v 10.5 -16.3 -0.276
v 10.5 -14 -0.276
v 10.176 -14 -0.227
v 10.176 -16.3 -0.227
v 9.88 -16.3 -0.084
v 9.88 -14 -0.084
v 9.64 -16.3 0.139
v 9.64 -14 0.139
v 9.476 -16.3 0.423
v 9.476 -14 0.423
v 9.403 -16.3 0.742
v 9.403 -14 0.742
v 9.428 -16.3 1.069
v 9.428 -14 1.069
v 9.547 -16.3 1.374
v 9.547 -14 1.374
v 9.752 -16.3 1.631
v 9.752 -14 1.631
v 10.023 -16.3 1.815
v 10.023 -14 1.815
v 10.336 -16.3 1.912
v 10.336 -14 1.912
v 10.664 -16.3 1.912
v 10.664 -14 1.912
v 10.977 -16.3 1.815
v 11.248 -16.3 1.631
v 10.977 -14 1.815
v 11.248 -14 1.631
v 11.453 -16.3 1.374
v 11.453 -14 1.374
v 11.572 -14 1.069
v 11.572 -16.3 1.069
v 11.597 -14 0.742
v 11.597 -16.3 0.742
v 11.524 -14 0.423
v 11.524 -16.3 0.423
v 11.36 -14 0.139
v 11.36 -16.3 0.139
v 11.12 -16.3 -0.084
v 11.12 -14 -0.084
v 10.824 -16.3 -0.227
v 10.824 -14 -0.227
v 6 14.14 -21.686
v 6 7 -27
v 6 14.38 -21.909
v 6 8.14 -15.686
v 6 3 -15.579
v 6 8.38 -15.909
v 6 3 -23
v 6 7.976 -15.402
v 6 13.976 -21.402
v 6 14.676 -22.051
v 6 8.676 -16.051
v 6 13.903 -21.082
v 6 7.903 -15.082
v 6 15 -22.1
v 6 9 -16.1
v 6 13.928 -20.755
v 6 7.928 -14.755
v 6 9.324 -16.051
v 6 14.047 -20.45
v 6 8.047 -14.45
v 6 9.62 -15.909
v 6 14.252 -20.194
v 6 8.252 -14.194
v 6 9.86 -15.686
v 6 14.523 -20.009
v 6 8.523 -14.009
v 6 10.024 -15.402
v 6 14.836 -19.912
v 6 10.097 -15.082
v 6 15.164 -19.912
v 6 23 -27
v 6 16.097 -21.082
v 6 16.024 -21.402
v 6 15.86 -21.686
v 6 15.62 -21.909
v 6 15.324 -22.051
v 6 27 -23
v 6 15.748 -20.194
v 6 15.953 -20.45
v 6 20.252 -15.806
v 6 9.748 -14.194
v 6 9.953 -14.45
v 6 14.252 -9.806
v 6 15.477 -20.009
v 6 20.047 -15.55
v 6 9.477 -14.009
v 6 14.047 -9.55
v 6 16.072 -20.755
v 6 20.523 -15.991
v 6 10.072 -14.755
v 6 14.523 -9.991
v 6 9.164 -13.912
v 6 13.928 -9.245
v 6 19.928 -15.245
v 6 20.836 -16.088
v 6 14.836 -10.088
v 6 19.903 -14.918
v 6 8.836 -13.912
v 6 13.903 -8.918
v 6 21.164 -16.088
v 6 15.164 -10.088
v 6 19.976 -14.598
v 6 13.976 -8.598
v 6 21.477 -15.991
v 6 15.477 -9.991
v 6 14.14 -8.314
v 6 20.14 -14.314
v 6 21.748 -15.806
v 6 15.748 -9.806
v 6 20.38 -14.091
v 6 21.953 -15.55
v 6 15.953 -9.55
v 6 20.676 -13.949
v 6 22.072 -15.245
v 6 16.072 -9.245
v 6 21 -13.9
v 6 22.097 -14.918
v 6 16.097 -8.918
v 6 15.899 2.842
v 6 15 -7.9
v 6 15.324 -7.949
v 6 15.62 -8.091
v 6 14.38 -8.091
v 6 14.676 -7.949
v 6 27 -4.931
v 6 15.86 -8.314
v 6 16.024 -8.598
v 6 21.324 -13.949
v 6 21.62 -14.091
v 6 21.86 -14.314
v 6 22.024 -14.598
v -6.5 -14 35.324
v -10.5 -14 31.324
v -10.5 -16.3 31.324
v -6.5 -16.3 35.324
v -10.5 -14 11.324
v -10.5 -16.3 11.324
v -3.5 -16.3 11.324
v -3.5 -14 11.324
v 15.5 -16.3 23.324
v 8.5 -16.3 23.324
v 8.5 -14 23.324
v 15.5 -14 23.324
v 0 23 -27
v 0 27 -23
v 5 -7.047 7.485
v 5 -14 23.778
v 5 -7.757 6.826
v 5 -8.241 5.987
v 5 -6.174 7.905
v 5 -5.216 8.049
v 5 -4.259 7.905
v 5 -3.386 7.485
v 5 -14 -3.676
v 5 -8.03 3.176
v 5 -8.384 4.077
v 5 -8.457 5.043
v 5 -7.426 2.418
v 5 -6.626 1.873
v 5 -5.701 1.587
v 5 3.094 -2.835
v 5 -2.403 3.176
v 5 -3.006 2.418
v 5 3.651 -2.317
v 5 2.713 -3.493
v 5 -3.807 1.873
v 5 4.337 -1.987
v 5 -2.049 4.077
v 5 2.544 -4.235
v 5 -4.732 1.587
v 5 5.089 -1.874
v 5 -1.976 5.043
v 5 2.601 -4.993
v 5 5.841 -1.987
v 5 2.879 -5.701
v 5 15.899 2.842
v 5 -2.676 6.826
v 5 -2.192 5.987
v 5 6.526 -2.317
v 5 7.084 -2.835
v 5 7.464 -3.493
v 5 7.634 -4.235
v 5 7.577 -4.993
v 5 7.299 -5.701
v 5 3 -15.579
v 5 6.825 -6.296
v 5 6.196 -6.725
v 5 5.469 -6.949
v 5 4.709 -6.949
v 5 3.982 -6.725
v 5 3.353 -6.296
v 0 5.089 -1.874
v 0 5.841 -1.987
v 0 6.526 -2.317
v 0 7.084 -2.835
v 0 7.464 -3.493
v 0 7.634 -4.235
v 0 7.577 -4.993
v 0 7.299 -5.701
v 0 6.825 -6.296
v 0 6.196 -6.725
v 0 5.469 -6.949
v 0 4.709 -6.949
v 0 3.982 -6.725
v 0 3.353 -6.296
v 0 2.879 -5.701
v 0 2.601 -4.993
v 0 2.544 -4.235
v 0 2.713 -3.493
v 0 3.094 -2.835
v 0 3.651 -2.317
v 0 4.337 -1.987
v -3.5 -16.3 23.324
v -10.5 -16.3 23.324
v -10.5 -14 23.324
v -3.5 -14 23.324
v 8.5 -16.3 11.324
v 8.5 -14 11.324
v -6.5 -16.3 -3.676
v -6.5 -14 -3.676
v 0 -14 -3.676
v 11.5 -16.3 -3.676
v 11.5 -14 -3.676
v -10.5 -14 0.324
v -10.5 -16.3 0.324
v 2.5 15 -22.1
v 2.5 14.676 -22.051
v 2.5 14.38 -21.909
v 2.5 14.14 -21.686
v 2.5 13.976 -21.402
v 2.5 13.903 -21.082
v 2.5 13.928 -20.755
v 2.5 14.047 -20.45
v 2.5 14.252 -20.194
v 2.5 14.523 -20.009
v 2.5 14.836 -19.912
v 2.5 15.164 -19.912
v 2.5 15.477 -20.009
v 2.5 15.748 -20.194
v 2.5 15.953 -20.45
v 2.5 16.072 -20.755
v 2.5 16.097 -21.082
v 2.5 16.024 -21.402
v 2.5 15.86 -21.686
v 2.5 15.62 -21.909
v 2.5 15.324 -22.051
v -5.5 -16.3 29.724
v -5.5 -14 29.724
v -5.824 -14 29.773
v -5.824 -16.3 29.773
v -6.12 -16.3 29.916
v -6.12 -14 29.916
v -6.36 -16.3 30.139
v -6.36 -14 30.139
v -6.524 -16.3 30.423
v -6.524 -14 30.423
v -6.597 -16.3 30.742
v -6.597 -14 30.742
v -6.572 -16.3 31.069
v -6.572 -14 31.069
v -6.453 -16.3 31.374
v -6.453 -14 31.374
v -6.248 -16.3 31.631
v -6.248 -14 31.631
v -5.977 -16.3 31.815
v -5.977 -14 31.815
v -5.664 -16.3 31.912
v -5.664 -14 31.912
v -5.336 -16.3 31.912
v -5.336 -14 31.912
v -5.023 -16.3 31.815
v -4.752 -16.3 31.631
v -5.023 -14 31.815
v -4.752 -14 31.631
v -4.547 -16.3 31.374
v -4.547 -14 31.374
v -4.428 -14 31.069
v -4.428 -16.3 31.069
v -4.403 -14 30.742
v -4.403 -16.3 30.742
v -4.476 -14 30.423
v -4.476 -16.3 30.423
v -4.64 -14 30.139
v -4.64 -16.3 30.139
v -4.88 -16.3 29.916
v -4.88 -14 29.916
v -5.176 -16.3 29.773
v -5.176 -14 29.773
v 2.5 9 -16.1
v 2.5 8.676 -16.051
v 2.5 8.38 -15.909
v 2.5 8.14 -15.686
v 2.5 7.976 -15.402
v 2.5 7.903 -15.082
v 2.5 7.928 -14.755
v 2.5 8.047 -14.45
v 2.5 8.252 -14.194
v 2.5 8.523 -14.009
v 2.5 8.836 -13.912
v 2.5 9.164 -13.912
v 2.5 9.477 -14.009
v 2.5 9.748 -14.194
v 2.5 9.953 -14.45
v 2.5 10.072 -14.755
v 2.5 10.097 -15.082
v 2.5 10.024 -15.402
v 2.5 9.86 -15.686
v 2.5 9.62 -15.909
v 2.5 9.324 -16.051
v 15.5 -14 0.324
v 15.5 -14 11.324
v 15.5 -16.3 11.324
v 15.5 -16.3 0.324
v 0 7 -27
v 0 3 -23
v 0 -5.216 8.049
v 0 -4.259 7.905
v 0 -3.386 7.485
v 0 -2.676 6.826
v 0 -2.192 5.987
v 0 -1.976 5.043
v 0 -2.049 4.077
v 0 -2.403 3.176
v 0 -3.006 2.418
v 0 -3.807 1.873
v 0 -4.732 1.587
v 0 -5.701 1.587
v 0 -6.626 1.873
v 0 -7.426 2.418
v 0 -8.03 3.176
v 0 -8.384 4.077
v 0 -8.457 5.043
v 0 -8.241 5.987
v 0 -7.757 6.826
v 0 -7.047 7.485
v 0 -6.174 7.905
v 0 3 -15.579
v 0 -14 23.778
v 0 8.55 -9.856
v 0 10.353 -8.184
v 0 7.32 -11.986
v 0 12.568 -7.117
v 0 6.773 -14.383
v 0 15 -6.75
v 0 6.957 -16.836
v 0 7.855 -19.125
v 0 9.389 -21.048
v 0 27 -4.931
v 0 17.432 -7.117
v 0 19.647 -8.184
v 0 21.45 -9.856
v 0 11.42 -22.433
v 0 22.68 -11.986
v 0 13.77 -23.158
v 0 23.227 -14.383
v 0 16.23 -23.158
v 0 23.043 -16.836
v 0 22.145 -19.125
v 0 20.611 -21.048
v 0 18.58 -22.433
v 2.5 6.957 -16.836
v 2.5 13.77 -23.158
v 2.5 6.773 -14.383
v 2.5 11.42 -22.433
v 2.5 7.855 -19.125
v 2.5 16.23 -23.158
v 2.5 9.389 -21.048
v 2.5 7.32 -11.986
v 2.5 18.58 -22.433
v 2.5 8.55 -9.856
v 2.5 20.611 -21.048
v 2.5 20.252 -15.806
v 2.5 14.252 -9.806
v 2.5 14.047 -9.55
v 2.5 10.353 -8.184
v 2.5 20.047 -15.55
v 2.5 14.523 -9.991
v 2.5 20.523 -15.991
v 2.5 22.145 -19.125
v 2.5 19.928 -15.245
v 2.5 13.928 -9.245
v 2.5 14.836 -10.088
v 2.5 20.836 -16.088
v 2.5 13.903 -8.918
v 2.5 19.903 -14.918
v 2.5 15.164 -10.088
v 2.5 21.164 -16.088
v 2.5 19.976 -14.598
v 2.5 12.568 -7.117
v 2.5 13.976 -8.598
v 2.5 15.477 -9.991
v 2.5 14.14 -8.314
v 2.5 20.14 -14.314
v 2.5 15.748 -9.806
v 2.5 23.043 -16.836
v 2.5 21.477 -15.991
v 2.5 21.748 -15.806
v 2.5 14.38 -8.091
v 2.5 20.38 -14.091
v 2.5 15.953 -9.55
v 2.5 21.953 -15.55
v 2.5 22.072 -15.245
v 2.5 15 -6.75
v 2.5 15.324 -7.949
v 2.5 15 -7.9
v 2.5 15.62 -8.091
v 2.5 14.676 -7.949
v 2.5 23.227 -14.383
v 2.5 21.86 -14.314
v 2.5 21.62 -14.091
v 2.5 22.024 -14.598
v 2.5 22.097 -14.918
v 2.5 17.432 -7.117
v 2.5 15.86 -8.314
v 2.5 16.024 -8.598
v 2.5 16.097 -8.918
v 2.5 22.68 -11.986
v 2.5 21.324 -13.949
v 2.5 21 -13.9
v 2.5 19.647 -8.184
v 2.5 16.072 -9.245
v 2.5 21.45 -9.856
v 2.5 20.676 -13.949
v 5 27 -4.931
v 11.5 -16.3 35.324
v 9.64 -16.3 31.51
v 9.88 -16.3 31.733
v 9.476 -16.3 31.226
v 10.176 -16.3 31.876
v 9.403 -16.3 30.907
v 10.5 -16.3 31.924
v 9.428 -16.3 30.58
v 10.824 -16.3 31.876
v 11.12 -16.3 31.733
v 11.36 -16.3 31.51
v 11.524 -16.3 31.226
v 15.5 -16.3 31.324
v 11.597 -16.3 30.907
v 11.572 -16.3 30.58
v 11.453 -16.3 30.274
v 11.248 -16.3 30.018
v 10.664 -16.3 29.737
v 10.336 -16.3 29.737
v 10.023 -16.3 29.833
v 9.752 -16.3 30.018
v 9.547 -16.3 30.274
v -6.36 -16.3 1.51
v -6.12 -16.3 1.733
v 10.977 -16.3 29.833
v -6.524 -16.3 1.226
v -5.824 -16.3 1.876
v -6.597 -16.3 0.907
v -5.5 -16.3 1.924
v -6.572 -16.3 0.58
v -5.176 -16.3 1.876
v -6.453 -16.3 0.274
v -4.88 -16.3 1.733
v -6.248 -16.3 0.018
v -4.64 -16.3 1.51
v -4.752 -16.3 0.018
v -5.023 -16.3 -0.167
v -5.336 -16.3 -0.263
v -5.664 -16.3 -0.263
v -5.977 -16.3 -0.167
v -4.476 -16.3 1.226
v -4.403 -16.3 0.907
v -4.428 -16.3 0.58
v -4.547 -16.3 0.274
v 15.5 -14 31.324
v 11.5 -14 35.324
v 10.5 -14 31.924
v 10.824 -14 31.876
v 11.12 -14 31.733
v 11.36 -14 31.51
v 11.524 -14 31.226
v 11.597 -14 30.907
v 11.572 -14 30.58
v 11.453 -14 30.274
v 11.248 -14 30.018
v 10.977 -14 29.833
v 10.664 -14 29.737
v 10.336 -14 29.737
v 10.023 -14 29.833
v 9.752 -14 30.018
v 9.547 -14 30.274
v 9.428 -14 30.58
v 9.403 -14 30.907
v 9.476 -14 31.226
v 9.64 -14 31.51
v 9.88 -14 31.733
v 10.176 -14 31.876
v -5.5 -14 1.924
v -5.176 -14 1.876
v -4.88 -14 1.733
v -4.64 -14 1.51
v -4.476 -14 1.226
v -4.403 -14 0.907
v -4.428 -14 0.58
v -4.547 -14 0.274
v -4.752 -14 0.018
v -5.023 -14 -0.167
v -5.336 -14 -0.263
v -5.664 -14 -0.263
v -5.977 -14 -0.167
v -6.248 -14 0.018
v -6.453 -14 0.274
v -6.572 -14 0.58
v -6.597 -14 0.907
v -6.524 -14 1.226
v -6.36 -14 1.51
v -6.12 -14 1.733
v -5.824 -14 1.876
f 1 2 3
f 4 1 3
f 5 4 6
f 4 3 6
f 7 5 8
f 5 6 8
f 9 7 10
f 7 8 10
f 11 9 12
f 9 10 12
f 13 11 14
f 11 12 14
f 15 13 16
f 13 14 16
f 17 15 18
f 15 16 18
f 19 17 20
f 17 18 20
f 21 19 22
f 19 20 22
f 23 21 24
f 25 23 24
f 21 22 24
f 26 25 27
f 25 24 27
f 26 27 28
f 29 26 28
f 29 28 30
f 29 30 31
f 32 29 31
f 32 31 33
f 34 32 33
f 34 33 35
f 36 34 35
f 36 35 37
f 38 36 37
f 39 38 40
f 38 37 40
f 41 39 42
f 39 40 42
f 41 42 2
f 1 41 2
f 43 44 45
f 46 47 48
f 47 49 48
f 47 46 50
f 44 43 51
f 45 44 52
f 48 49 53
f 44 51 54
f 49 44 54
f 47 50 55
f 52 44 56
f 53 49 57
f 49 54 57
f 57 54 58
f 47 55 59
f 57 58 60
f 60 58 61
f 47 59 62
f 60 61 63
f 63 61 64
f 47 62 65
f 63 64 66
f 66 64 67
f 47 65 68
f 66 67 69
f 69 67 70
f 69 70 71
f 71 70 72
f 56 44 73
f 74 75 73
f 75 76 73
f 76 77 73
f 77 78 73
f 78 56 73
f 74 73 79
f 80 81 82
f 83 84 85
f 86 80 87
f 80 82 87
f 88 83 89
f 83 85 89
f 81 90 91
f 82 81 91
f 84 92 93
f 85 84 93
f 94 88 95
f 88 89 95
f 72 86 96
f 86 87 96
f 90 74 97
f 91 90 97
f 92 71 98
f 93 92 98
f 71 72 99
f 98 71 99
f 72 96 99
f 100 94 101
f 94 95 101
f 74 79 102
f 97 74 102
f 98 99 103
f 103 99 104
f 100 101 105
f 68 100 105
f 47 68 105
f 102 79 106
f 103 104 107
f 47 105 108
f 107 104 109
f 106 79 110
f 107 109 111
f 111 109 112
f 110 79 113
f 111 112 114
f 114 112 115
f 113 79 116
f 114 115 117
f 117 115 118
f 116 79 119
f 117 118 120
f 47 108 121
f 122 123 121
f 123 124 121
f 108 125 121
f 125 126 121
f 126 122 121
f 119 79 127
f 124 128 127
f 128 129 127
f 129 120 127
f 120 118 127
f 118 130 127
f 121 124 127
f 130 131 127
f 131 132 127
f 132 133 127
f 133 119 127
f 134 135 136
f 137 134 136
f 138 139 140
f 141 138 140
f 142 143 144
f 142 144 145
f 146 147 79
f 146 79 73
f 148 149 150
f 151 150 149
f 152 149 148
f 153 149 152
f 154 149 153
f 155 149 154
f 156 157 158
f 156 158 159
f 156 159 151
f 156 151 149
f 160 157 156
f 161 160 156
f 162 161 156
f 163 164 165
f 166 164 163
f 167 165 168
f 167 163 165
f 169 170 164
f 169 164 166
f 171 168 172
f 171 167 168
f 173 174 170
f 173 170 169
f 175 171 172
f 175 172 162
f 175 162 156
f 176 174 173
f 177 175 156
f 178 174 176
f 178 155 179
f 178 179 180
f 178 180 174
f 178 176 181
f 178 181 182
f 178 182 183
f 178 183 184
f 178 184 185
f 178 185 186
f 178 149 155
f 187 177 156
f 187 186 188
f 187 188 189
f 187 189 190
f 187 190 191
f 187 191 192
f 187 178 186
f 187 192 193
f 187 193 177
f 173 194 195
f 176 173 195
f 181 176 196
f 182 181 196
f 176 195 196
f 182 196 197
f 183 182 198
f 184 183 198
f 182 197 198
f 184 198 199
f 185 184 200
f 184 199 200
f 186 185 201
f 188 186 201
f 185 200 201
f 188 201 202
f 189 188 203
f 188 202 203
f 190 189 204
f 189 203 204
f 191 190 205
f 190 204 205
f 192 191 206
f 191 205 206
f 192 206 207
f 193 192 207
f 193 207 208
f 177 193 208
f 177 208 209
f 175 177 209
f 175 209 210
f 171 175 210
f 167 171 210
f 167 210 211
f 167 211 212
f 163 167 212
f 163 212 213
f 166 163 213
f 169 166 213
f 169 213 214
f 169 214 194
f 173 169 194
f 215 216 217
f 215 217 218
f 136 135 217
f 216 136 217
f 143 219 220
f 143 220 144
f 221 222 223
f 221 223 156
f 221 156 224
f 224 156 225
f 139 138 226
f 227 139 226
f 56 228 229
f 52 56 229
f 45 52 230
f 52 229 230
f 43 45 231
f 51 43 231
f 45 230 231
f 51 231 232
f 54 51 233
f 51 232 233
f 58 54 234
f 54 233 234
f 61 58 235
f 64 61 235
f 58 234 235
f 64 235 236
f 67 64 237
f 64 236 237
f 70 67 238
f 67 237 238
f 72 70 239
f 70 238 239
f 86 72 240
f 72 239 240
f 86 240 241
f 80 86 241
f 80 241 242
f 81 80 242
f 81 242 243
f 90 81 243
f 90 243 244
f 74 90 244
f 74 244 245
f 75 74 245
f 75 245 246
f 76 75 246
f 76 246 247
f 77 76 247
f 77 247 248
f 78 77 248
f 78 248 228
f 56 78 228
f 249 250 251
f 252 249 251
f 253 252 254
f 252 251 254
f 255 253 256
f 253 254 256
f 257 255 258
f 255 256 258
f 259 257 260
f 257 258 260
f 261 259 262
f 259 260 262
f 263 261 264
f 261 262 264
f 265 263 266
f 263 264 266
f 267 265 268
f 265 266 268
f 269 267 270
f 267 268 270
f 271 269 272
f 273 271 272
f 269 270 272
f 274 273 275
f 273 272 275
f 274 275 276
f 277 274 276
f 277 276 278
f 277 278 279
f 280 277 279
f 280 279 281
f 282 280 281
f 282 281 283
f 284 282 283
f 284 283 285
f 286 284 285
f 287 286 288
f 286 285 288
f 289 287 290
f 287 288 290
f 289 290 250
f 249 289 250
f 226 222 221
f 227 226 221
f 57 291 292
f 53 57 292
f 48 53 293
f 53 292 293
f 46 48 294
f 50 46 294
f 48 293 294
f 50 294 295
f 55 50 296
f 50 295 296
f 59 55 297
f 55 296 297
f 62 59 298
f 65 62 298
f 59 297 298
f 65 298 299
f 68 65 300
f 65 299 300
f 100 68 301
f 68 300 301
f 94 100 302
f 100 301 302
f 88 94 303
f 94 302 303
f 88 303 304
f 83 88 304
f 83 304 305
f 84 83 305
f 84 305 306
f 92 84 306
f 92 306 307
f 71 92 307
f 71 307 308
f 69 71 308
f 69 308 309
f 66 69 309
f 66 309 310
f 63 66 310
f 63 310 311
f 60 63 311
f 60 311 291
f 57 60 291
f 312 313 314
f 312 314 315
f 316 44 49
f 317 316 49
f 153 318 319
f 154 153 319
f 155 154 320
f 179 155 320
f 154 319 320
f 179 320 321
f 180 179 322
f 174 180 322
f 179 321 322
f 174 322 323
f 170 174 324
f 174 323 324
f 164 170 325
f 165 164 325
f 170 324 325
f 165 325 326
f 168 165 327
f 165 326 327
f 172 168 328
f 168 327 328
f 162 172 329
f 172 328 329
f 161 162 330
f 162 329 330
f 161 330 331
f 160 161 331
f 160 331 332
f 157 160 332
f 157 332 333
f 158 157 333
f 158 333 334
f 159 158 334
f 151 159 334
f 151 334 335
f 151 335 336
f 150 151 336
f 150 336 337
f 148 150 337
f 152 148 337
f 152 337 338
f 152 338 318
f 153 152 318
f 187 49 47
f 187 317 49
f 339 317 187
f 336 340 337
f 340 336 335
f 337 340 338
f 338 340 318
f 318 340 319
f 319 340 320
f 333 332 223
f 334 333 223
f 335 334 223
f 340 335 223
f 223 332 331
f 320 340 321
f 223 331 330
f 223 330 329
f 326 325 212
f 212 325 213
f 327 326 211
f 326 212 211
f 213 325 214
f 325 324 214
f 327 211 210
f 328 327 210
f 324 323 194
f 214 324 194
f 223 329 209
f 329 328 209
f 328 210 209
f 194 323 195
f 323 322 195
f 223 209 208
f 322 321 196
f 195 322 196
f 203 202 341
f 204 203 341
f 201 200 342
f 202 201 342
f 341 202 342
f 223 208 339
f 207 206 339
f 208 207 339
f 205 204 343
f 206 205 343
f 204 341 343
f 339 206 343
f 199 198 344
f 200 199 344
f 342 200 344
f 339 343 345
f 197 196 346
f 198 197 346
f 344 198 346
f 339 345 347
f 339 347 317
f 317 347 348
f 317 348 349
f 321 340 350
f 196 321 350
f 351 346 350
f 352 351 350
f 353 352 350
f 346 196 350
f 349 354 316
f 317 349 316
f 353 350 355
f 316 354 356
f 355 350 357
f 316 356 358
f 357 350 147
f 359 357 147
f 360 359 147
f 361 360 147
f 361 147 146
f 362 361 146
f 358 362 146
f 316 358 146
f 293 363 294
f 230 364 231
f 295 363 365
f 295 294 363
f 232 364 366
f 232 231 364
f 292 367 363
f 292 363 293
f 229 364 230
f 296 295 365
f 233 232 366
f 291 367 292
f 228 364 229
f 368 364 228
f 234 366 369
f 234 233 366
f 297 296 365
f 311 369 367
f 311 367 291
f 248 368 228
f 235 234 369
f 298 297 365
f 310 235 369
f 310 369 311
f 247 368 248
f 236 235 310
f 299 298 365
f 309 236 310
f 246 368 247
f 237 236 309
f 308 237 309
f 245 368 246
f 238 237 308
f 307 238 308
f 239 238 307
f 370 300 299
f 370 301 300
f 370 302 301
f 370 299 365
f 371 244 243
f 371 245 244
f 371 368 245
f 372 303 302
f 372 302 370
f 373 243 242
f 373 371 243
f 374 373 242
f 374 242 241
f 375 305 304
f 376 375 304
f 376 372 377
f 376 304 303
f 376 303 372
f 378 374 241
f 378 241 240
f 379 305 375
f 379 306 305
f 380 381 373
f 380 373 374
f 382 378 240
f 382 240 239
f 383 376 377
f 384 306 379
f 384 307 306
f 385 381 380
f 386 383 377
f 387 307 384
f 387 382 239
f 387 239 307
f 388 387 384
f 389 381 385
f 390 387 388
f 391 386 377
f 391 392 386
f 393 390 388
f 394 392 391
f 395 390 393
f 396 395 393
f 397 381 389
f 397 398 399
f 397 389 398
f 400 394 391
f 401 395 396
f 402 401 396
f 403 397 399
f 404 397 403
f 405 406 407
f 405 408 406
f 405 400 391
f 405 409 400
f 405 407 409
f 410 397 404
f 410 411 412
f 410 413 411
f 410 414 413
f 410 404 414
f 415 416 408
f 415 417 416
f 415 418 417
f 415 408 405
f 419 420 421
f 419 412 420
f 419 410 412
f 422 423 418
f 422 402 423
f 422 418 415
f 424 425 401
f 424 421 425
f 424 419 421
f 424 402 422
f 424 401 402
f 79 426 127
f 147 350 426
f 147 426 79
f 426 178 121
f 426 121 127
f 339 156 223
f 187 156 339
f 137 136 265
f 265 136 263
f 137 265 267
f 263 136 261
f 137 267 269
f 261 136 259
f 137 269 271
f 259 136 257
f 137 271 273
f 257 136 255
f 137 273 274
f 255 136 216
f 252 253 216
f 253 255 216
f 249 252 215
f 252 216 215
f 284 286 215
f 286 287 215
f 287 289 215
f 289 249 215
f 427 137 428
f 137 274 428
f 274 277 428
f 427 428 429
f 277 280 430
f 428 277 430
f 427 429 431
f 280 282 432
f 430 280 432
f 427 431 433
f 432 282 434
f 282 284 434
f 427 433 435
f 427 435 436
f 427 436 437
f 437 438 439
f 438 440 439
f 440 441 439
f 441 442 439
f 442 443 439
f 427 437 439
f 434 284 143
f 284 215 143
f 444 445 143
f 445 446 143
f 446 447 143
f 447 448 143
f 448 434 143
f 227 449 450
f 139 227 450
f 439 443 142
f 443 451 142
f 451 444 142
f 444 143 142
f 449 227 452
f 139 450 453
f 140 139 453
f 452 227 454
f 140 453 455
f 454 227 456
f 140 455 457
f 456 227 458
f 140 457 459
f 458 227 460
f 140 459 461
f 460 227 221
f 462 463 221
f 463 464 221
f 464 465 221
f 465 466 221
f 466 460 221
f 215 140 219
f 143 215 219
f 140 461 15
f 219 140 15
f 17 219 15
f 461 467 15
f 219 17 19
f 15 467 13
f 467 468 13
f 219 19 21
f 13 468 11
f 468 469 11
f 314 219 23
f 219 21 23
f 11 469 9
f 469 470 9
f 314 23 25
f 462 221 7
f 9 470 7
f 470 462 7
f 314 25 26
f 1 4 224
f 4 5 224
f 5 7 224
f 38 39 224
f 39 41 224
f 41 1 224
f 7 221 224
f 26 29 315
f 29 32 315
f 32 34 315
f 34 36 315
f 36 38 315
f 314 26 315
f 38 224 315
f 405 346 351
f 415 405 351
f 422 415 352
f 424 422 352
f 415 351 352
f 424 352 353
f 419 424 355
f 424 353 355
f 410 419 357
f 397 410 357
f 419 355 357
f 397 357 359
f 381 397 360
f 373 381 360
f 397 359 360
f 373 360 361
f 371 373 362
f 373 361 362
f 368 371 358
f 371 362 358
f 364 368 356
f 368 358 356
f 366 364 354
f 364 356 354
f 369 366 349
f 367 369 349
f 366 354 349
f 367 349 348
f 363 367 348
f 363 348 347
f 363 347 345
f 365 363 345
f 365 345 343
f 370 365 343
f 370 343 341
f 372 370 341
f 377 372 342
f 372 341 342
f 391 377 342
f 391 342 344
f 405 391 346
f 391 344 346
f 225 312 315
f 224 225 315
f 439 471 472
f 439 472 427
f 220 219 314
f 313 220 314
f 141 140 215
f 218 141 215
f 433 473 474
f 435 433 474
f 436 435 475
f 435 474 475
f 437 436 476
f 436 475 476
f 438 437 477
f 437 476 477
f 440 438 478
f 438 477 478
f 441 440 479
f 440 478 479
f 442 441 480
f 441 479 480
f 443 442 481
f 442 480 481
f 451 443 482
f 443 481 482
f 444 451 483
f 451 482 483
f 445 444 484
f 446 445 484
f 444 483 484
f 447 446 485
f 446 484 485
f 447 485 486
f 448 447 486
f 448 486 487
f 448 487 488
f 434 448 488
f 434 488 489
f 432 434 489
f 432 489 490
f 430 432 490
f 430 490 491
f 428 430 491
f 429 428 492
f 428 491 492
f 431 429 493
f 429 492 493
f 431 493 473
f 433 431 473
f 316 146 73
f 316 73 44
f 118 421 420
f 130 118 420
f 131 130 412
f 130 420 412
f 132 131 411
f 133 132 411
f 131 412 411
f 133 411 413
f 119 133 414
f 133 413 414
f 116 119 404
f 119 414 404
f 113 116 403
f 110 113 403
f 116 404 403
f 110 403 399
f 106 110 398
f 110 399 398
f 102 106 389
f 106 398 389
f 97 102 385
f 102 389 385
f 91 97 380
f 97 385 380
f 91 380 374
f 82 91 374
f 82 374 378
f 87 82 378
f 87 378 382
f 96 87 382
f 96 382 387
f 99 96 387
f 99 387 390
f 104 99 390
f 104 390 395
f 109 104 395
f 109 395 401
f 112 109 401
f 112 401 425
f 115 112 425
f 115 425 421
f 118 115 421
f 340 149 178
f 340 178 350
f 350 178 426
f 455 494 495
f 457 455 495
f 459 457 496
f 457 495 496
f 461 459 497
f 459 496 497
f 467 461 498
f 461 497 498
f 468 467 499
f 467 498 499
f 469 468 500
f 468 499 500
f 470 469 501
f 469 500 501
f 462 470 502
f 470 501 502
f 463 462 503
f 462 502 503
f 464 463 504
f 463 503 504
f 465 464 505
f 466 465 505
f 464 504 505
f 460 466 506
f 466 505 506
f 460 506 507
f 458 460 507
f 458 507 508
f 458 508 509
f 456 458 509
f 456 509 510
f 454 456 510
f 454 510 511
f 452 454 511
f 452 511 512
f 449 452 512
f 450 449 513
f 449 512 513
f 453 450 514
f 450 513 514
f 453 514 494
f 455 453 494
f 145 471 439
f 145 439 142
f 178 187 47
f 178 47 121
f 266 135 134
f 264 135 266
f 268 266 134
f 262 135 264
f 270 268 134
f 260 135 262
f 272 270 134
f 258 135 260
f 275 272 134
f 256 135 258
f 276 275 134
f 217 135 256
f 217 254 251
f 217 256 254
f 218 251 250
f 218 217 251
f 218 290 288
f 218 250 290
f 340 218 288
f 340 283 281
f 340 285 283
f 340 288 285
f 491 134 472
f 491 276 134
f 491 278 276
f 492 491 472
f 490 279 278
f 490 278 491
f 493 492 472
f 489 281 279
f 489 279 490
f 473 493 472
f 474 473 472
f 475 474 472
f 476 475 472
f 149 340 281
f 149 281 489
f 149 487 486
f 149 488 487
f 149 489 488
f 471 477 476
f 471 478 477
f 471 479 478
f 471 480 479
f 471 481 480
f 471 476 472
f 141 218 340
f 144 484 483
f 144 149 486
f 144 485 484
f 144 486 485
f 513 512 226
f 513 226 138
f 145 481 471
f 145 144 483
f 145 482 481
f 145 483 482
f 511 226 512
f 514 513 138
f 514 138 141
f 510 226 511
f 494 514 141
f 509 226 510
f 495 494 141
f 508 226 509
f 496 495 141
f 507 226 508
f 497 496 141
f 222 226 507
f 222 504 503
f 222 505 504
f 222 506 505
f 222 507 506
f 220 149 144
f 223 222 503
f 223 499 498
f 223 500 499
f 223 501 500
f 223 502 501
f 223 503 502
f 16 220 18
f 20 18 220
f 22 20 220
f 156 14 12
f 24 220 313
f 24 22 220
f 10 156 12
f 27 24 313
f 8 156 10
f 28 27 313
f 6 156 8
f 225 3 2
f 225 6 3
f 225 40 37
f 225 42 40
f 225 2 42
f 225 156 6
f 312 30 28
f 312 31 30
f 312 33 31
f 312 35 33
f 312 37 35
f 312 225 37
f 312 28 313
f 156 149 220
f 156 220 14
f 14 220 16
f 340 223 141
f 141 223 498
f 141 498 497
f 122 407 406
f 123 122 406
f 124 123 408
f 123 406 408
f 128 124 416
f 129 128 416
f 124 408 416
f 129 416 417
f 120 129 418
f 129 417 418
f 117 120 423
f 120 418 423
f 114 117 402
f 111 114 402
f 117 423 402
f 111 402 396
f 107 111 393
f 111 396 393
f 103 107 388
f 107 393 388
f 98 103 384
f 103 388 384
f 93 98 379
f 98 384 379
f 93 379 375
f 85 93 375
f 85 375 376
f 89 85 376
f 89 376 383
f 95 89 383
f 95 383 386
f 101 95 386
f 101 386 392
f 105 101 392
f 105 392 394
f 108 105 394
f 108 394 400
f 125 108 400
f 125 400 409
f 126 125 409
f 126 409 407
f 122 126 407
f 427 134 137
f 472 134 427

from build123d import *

# Parameters (mm, degrees)
EXTRUDE_1_DEPTH      = 30
SKETCH_2_R           = 8.25
CUT_EXTRUDE_1_DEPTH  = 2.5
EXTRUDE_2_DEPTH      = 41
SKETCH_6_R           = 8
CUT_EXTRUDE_3_DEPTH  = 4
CUT_EXTRUDE_4_DEPTH  = 83.710337927
CUT_EXTRUDE_6_DEPTH  = 23
EXTRUDE_3_DEPTH      = 23
CUT_EXTRUDE_7_DEPTH  = 46.5
EXTRUDE_4_DEPTH      = 4
CUT_EXTRUDE_8_DEPTH  = 23
CUT_EXTRUDE_9_DEPTH  = 65.964988157
SKETCH_16_R          = 1.25
CUT_EXTRUDE_10_DEPTH = 65.964988157
CUT_EXTRUDE_11_DEPTH = 44
EXTRUDE_5_DEPTH      = 2.5
CUT_EXTRUDE_12_DEPTH = 3
EXTRUDE_6_DEPTH      = 41
CUT_EXTRUDE_13_DEPTH = 41
CUT_EXTRUDE_14_DEPTH = 17
CHAMFER_1_SIZE       = 4
CUT_EXTRUDE_16_DEPTH = 53.085522264
EXTRUDE_8_DEPTH      = 5
CUT_EXTRUDE_17_DEPTH = 4
SKETCH_30_W          = 26
SKETCH_30_H          = 39
SKETCH_30_R          = 1.1
EXTRUDE_10_DEPTH     = 2.3
CHAMFER_4_SIZE       = 4
SKETCH_32_R          = 2.551786445
SKETCH_32_R_2        = 3.249198584
CUT_EXTRUDE_18_DEPTH = 48.085687781
SKETCH_33_W          = 7
SKETCH_33_H          = 12
CUT_EXTRUDE_19_DEPTH = 10
EXTRUDE_11_DEPTH     = 1
SKETCH_8_R           = 1.1
CUT_EXTRUDE_5_DEPTH  = 47.322910032


with BuildPart() as part:
    # 草图1 → 凸台-拉伸1 (new body)
    with BuildSketch(Plane(origin=(0, 0, 0), x_dir=(1, 0, 0), z_dir=(0, 1, 0))):
        Polygon((0, 0), (-15.325055808, 0), (-21.84047557, -15.349367059), (5.774670034, -27.071300914), (30, 30), (0, 30), align=None)
    extrude(amount=EXTRUDE_1_DEPTH)

    # 草图2 → 切除-拉伸1 (cut)
    with BuildSketch(Plane.ZY):
        with Locations((-15, 15)):
            Circle(SKETCH_2_R)
    extrude(amount=-CUT_EXTRUDE_1_DEPTH, mode=Mode.SUBTRACT)

    # 草图5 → 凸台-拉伸2 (add)
    with BuildSketch(Plane.XZ):
        Polygon((-21.84047557, 15.349367059), (-9.337079458, -14.106788251), (18.278066145, -2.384854396), (5.774670034, 27.071300914), align=None)
    extrude(amount=EXTRUDE_2_DEPTH)

    # 草图6 → 切除-拉伸3 (cut)
    with BuildSketch(Plane.XZ.offset(41)):
        with Locations(Location((-1.781204712, 6.482256331, 0), (0, 0, 270))):
            Circle(SKETCH_6_R)
    extrude(amount=-CUT_EXTRUDE_3_DEPTH, mode=Mode.SUBTRACT)

    # 草图7 → 切除-拉伸4 (cut, through all)
    with BuildSketch(Plane(origin=(0, 30, 0), x_dir=(1, 0, 0), z_dir=(0, 1, 0))):
        Polygon((0, 27), (5, 27), (5, -28.896309146), (30, 30), (0, 30), align=None)
    extrude(amount=-CUT_EXTRUDE_4_DEPTH, mode=Mode.SUBTRACT)

    # 草图10 → 切除-拉伸6 (cut)
    with BuildSketch(Plane.XZ.offset(41)):
        Polygon((-19.999465863, 16.130829316), (-7.496069751, -13.325325994), (-9.337079458, -14.106788251), (-21.84047557, 15.349367059), align=None)
        Polygon((5.774670034, 27.071300914), (3.933660327, 26.289838657), (16.437056438, -3.166316653), (18.278066145, -2.384854396), align=None)
    extrude(amount=-CUT_EXTRUDE_6_DEPTH, mode=Mode.SUBTRACT)

    # 草图11 → 凸台-拉伸3 (add)
    with BuildSketch(Plane.XZ.offset(41)):
        Polygon((-19.999465863, 16.130829316), (-24.297508276, 26.256382704), (-0.364382087, 36.415392045), (3.933660327, 26.289838657), align=None)
        Polygon((5, 23.777699815), (16.437056438, -3.166316653), (5, -8.021059083), align=None)
    extrude(amount=-EXTRUDE_3_DEPTH)

    # 草图12 → 切除-拉伸7 (cut)
    with BuildSketch(Plane.XZ.offset(41)):
        Polygon((0.345866355, -31.799769722), (-9.058994265, -9.64330658), (14.874131924, 0.51570276), (24.278992544, -21.640760381), align=None)
    extrude(amount=-CUT_EXTRUDE_7_DEPTH, mode=Mode.SUBTRACT)

    # 草图13 → 凸台-拉伸4 (add)
    with BuildSketch(Plane(origin=(0, -18, 0), x_dir=(1, 0, 0), z_dir=(0, 1, 0))):
        Polygon((14.874131924, -0.51570276), (-9.058994265, 9.64330658), (-24.297508276, -26.256382704), (-0.364382087, -36.415392045), align=None)
    extrude(amount=EXTRUDE_4_DEPTH)

    # 草图14 → 切除-拉伸8 (cut)
    with BuildSketch(Plane.XZ.offset(41)):
        Polygon((-9.058994265, -9.64330658), (14.874131924, 0.51570276), (-0.364382087, 36.415392045), (-24.297508276, 26.256382704), align=None)
    extrude(amount=-CUT_EXTRUDE_8_DEPTH, mode=Mode.SUBTRACT)

    # 草图15 → 切除-拉伸9 (cut, through all)
    with BuildSketch(Plane.XZ.offset(18)):
        Polygon((5, 23.777699815), (5, 26.742472994), (3.933660327, 26.289838657), align=None)
        Polygon((-19.999465863, 16.130829316), (-7.496069751, -13.325325994), (-9.337079458, -14.106788251), (-21.84047557, 15.349367059), align=None)
    extrude(amount=-CUT_EXTRUDE_9_DEPTH, mode=Mode.SUBTRACT)

    # 草图16 → 切除-拉伸10 (cut, through all)
    with BuildSketch(Plane.XZ.offset(18)):
        with Locations(Location((-17.936693931, 24.067766506, 0), (0, 0, 270))):
            Circle(SKETCH_16_R)
        with Locations(Location((-3.208616276, 30.319464562, 0), (0, 0, 90))):
            Circle(SKETCH_16_R)
        with Locations(Location((8.513317579, 2.704318958, 0), (0, 0, 270))):
            Circle(SKETCH_16_R)
        with Locations(Location((-6.214760076, -3.547379097, 0), (0, 0, 270))):
            Circle(SKETCH_16_R)
    extrude(amount=-CUT_EXTRUDE_10_DEPTH, mode=Mode.SUBTRACT)

    # 草图17 → 切除-拉伸11 (cut)
    with BuildSketch(Plane(origin=(0, 30, 0), x_dir=(1, 0, 0), z_dir=(0, 1, 0))):
        Polygon((-9.058994265, 9.64330658), (-19.999465863, -16.130829316), (0, -24.620098913), (0, 5.797991655), align=None)
    extrude(amount=-CUT_EXTRUDE_11_DEPTH, mode=Mode.SUBTRACT)

    # 草图18 → 凸台-拉伸5 (add)
    with BuildSketch(Plane.XZ.offset(-5.5)):
        Polygon((5, -3.675617573), (0, -5.797991655), (0, -27), (5, -27), align=None)
    extrude(amount=EXTRUDE_5_DEPTH)

    # 草图20 → 切除-拉伸12 (cut)
    with BuildSketch(Plane(origin=(0, 30, 0), x_dir=(1, 0, 0), z_dir=(0, 1, 0))):
        Polygon((0, 27), (0, -24.620098913), (3.933660327, -26.289838657), (5, -23.777699815), (5, 27), align=None)
    extrude(amount=-CUT_EXTRUDE_12_DEPTH, mode=Mode.SUBTRACT)

    # 草图21 → 凸台-拉伸6 (add)
    with BuildSketch(Plane(origin=(0, 27, 0), x_dir=(1, 0, 0), z_dir=(0, 1, 0))):
        Polygon((0, -24.620098913), (0, -35.556961644), (3.933660327, -26.289838657), align=None)
    extrude(amount=-EXTRUDE_6_DEPTH)

    # 草图22 → 切除-拉伸13 (cut)
    with BuildSketch(Plane(origin=(0, 27, 0), x_dir=(1, 0, 0), z_dir=(0, 1, 0))):
        Polygon((5, -23.777699815), (0, -23.777699815), (0, -35.556961644), align=None)
    extrude(amount=-CUT_EXTRUDE_13_DEPTH, mode=Mode.SUBTRACT)

    # 草图23 → 切除-拉伸14 (cut)
    with BuildSketch(Plane.XZ.offset(-3)):
        Polygon((5, -3.675617573), (0, -3.675617573), (0, -5.797991655), align=None)
    extrude(amount=CUT_EXTRUDE_14_DEPTH, mode=Mode.SUBTRACT)

    # 倒角1
    chamfer_1_edges = [part.edges().sort_by_distance(p)[0] for p in [
        (-24.297508276, -16, 26.256382704),
        (-0.364382087, -16, 36.415392045),
        (14.874131924, -16, 0.51570276),
        (-9.058994265, -16, -9.64330658),
        (2.5, 3, -27),
        (2.5, 27, -27),
    ]]
    chamfer(chamfer_1_edges, length=CHAMFER_1_SIZE)

    # 草图26 → 切除-拉伸16 (cut, through all)
    with BuildSketch(Plane(origin=(5, 0, 0), x_dir=(0, 0, -1), z_dir=(1, 0, 0))):
        Polygon((-23.777699815, -14), (4.930809251, 27), (-23.777699815, 27), align=None)
    extrude(amount=-CUT_EXTRUDE_16_DEPTH, mode=Mode.SUBTRACT)

    # 草图27 → 凸台-拉伸8 (add)
    with BuildSketch(Plane(origin=(5, 0, 0), x_dir=(0, 0, -1), z_dir=(1, 0, 0))):
        Polygon((3.675617573, -14), (15.579145723, 3), (3.675617573, 3), align=None)
    extrude(amount=-EXTRUDE_8_DEPTH)

    # 草图31 → 切除-拉伸17 (cut)
    with BuildSketch(Plane.XZ.offset(18)):
        Polygon((-5.376974851, -8.080382066), (11.192112511, -1.047221754), (13.311207411, 4.197722174), (1.198542427, 32.733372631), (-4.0464015, 34.852467531), (-20.615488863, 27.819307218), (-22.734583762, 22.574363291), (-10.621918779, -5.961287167), align=None)
    extrude(amount=-CUT_EXTRUDE_17_DEPTH, mode=Mode.SUBTRACT)

    # 草图30 → 凸台-拉伸10 (add)
    with BuildSketch(Plane(origin=(0, -14, 0), x_dir=(1, 0, 0), z_dir=(0, 1, 0))):
        with Locations((2.5, -15.824382427)):
            Rectangle(SKETCH_30_W, SKETCH_30_H)
        with Locations(Location((-5.5, -0.824382427, 0), (0, 0, 270))):
            Circle(SKETCH_30_R, mode=Mode.SUBTRACT)
        with Locations(Location((10.5, -0.824382427, 0), (0, 0, 90))):
            Circle(SKETCH_30_R, mode=Mode.SUBTRACT)
        with Locations(Location((10.5, -30.824382427, 0), (0, 0, 270))):
            Circle(SKETCH_30_R, mode=Mode.SUBTRACT)
        with Locations(Location((-5.5, -30.824382427, 0), (0, 0, 90))):
            Circle(SKETCH_30_R, mode=Mode.SUBTRACT)
    extrude(amount=-EXTRUDE_10_DEPTH)

    # 倒角4
    chamfer_4_edges = [part.edges().sort_by_distance(p)[0] for p in [
        (-10.5, -15.15, 35.324382427),
        (-10.5, -15.15, -3.675617573),
        (15.5, -15.15, -3.675617573),
        (15.5, -15.15, 35.324382427),
    ]]
    chamfer(chamfer_4_edges, length=CHAMFER_4_SIZE)

    # 草图32 → 切除-拉伸18 (cut, through all)
    with BuildSketch(Plane.ZY):
        with Locations((-4.425551632, 5.088873795)):
            Circle(SKETCH_32_R)
        with Locations((4.800137825, -5.216417619)):
            Circle(SKETCH_32_R_2)
    extrude(amount=-CUT_EXTRUDE_18_DEPTH, mode=Mode.SUBTRACT)

    # 草图33 → 切除-拉伸19 (cut)
    with BuildSketch(Plane.XZ.offset(16.3)):
        with Locations((-7, 17.324382427)):
            Rectangle(SKETCH_33_W, SKETCH_33_H)
        with Locations((12, 17.324382427)):
            Rectangle(SKETCH_33_W, SKETCH_33_H)
    extrude(amount=-CUT_EXTRUDE_19_DEPTH, mode=Mode.SUBTRACT)

    # 草图34 → 凸台-拉伸11 (add)
    with BuildSketch(Plane(origin=(5, 0, 0), x_dir=(0, 0, -1), z_dir=(1, 0, 0))):
        Polygon((15.579145723, 3), (-2.842306745, 15.898839883), (4.930809251, 27), (23, 27), (27, 23), (27, 7), (23, 3), align=None)
    extrude(amount=EXTRUDE_11_DEPTH)

    # 草图8 → 切除-拉伸5 (cut, through all)
    with BuildSketch(Plane.ZY.offset(-2.5)):
        with Locations((-15, 21)):
            Circle(SKETCH_8_R)
        with Locations((-9, 15)):
            Circle(SKETCH_8_R)
        with Locations(Location((-15, 9, 0), (0, 0, 180))):
            Circle(SKETCH_8_R)
        with Locations(Location((-21, 15, 0), (0, 0, 180))):
            Circle(SKETCH_8_R)
    extrude(amount=-CUT_EXTRUDE_5_DEPTH, mode=Mode.SUBTRACT)


solid = part.part
